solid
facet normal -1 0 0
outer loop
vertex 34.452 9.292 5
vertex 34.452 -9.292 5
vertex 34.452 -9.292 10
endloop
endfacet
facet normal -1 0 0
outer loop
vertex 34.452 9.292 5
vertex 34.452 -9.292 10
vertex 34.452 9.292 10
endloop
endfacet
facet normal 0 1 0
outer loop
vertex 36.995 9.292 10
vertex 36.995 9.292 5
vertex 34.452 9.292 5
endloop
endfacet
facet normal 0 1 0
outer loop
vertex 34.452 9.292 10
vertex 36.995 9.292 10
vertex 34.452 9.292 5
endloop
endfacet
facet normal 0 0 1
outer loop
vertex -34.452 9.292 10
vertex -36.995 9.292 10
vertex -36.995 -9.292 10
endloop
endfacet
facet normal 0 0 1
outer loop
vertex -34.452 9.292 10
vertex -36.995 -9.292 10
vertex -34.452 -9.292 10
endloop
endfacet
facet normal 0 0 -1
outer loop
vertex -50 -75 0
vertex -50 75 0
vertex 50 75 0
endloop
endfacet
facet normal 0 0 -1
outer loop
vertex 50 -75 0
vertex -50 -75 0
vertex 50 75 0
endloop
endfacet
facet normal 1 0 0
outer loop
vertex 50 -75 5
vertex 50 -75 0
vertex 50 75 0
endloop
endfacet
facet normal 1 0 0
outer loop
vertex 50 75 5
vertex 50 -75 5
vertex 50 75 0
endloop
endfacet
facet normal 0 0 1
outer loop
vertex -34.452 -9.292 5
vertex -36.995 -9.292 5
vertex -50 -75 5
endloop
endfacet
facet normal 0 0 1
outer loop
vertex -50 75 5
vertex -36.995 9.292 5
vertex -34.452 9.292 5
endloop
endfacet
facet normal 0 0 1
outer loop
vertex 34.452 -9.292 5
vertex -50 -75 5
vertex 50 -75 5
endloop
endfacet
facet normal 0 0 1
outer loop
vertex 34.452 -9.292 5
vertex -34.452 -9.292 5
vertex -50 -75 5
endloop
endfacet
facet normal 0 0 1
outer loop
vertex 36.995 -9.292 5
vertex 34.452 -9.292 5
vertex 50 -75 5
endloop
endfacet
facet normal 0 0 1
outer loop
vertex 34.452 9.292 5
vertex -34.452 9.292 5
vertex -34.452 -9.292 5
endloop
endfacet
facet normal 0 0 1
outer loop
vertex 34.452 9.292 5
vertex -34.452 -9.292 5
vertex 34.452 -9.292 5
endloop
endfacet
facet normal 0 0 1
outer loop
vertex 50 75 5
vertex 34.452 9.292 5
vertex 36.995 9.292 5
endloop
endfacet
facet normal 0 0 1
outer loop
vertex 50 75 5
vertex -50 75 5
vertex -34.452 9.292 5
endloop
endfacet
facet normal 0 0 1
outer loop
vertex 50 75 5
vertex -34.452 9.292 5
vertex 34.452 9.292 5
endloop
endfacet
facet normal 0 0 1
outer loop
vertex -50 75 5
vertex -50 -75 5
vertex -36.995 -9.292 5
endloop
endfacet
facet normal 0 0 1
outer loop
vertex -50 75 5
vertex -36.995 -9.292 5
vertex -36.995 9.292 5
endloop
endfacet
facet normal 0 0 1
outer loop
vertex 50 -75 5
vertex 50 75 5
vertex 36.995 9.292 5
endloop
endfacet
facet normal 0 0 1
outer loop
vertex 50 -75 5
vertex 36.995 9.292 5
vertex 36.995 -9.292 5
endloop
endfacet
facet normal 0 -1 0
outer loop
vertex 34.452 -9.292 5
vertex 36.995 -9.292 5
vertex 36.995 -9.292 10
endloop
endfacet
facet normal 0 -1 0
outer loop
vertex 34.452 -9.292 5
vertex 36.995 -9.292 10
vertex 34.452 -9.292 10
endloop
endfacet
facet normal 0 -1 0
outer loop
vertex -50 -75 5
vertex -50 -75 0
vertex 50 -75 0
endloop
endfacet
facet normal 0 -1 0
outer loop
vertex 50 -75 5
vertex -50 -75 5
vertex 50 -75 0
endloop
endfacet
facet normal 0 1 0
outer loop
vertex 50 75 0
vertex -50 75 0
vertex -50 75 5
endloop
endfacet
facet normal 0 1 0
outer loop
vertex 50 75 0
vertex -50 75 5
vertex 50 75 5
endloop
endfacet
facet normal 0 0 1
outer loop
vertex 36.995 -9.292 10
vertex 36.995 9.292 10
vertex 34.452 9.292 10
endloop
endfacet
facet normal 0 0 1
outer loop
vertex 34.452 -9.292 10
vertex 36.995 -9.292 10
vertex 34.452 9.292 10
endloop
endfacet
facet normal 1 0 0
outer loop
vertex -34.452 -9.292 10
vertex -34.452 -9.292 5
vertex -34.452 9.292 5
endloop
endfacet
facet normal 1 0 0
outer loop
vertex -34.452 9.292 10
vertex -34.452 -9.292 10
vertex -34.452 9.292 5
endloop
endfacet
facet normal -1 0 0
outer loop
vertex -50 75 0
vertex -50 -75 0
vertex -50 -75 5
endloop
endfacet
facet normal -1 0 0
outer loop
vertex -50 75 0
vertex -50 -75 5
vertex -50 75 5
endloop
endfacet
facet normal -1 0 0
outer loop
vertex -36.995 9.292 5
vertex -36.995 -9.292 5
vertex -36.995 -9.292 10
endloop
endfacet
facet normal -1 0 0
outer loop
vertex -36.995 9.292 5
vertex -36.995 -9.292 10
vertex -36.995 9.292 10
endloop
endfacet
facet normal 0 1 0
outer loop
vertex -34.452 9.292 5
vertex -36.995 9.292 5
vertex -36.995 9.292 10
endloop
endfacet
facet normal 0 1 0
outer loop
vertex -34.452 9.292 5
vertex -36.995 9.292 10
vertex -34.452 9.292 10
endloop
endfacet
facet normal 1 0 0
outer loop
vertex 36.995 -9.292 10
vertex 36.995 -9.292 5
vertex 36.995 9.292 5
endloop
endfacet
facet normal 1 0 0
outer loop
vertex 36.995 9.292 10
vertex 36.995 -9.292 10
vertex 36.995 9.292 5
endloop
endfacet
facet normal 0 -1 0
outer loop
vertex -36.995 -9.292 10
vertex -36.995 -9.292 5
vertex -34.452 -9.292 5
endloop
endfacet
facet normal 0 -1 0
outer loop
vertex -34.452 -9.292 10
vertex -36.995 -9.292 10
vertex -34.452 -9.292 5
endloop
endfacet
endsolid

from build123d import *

# Parameters (mm, degrees)
SKETCH1_W           = 100
SKETCH1_H           = 150
BOSS_EXTRUDE1_DEPTH = 5
SKETCH2_W           = 2.543215169
SKETCH2_H           = 18.583792384
BOSS_EXTRUDE2_DEPTH = 5


with BuildPart() as part:
    # Sketch1 → Boss-Extrude1 (new body)
    with BuildSketch(Plane.XY):
        Rectangle(SKETCH1_W, SKETCH1_H)
    extrude(amount=BOSS_EXTRUDE1_DEPTH)

    # Sketch2 → Boss-Extrude2 (add)
    with BuildSketch(Plane.XY.offset(5)):
        with Locations((-35.723415387, 0)):
            Rectangle(SKETCH2_W, SKETCH2_H)
    boss_extrude2 = extrude(amount=BOSS_EXTRUDE2_DEPTH)

    # Mirror1: Boss-Extrude2 across plane
    add(boss_extrude2.mirror(Plane(origin=(0, 0, 0), x_dir=(0, 0, 1), z_dir=(1, 0, 0))))


solid = part.part
